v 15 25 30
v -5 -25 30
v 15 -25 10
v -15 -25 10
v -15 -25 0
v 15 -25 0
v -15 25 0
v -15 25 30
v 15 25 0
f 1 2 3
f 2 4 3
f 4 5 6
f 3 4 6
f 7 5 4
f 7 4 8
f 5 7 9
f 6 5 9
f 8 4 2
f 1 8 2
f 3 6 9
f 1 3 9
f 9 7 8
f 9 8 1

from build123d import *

# Parameters (mm, degrees)
F0_W     = 30
F0_H     = 50
F1_DEPTH = 30


with BuildPart() as f1:
    # F0 (on Top) → F1 (new body)
    with BuildSketch(Plane.XY):
        Rectangle(F0_W, F0_H)
    extrude(amount=F1_DEPTH)

    # F4: sweep along a path in F3
    with BuildLine(Plane.YZ.offset(15)) as f4_path:
        Line((25, 30), (-25, 10))
    # F2 (on face) → F4 (sweep, cut)
    with BuildSketch(Plane.XZ.offset(25)):
        Polygon((15, 30), (-5, 30), (15, 10), align=None)
        Polygon((-15, 30), (-15, 10), (-5, 30), align=None)
    sweep(path=f4_path.line, mode=Mode.SUBTRACT)


solid = f1.part
